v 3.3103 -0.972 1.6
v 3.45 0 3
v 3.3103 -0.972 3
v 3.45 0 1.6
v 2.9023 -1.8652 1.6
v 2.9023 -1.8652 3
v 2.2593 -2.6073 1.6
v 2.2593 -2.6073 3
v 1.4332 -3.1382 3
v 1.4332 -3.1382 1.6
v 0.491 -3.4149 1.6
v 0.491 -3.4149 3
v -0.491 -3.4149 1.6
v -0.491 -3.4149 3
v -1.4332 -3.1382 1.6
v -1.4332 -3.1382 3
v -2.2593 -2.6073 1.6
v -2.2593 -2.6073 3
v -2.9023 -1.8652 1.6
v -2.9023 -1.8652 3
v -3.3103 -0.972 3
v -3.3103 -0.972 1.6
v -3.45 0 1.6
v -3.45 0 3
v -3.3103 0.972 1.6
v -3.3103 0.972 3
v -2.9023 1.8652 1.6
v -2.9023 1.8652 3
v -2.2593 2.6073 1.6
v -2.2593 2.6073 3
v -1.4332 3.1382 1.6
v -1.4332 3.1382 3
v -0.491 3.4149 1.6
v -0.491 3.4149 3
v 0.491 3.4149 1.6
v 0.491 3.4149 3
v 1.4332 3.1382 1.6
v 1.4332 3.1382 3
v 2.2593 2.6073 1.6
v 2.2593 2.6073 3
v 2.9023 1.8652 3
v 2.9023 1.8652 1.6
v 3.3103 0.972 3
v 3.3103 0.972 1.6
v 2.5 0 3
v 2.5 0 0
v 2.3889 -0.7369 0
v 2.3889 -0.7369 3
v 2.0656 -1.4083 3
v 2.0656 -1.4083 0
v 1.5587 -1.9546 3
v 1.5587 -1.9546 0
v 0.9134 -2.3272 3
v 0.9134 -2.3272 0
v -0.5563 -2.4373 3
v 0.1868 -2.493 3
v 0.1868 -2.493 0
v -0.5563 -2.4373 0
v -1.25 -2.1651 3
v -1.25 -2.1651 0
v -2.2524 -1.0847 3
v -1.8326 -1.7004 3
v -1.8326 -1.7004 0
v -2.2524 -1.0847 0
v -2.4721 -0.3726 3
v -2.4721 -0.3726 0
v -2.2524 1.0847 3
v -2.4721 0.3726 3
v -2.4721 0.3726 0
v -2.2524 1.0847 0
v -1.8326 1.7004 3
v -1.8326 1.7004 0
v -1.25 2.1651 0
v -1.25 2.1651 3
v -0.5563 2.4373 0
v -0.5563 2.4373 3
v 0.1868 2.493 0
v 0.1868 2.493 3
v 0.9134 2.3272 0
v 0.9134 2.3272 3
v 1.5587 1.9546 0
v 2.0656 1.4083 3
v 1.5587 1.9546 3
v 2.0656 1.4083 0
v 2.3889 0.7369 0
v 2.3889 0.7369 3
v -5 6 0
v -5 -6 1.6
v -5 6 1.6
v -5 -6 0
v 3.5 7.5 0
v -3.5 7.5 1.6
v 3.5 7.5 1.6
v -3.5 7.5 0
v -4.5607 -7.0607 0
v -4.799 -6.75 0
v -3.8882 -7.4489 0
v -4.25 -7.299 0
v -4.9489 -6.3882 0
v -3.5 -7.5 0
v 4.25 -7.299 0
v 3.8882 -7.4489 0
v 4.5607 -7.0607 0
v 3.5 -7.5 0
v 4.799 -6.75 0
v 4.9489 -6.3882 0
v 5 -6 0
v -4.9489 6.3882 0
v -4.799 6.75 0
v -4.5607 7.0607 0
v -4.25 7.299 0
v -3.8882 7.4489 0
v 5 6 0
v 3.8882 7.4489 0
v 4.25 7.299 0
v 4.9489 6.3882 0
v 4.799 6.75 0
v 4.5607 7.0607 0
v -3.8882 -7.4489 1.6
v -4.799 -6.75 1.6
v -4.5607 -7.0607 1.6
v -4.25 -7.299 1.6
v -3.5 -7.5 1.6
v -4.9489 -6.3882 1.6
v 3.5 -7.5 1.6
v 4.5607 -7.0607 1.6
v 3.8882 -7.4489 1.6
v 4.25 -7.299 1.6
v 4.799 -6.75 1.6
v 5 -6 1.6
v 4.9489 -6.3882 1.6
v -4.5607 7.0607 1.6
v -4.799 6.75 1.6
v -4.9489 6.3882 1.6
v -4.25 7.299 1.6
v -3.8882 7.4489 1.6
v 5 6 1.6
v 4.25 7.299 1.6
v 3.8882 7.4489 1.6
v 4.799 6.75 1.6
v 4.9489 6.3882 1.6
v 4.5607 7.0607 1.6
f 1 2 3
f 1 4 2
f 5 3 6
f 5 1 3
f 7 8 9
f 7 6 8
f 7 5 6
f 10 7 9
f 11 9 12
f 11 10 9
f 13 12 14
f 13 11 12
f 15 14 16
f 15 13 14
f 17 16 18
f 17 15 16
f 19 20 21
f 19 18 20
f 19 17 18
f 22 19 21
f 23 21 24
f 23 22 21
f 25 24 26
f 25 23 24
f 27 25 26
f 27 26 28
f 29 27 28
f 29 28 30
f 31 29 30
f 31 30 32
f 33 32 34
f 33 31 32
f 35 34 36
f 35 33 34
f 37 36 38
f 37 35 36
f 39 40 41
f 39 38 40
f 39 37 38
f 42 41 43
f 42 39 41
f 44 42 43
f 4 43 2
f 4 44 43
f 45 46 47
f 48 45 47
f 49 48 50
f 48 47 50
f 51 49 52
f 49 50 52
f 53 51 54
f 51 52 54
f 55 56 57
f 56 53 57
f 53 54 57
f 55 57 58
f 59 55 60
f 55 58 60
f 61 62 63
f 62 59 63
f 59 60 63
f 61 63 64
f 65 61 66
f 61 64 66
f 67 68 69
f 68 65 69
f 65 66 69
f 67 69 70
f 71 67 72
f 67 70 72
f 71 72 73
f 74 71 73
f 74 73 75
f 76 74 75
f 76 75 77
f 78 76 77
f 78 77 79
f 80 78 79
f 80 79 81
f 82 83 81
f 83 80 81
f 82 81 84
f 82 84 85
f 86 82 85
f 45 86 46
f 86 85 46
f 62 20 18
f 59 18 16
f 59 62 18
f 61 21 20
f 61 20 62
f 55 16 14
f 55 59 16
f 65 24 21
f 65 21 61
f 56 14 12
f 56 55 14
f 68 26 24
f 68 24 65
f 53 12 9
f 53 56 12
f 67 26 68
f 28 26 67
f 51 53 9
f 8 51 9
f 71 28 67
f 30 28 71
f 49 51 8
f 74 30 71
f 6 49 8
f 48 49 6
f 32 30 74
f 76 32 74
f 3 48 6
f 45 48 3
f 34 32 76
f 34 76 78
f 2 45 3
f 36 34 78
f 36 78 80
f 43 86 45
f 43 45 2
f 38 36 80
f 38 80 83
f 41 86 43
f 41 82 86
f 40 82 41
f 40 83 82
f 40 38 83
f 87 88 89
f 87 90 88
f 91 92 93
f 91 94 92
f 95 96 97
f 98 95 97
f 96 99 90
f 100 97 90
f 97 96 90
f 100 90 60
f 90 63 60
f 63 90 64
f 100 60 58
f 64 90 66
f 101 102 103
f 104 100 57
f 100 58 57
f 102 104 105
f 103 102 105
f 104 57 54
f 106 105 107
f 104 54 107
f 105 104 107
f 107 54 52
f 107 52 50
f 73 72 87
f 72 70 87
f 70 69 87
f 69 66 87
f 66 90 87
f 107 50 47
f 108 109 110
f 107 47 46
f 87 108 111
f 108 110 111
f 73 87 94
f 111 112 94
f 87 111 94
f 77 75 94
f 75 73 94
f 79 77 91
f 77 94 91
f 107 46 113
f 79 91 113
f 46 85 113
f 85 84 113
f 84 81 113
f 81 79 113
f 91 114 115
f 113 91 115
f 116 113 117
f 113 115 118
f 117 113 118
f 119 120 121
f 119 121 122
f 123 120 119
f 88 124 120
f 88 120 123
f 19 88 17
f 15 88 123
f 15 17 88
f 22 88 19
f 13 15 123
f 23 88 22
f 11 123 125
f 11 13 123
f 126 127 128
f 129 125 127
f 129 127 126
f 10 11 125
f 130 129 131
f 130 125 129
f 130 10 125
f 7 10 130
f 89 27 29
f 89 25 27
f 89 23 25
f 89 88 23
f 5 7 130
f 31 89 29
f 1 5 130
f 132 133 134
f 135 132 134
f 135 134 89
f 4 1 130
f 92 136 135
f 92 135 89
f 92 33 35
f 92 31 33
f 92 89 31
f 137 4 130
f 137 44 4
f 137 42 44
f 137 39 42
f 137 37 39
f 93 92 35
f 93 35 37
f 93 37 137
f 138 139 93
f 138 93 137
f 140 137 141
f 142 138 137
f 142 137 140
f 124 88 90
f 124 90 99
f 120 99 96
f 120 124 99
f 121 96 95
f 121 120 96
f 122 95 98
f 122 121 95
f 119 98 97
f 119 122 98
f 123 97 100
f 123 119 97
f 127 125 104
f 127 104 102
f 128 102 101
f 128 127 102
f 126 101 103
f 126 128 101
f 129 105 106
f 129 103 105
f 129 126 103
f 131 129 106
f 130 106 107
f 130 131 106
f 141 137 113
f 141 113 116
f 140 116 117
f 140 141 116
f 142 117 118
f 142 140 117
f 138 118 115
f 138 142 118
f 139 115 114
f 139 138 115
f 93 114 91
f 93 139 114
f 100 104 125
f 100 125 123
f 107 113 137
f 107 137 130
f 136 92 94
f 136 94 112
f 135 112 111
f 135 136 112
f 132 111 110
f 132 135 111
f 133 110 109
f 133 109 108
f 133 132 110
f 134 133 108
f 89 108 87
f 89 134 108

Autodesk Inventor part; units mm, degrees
ref_plane "YZ Plane" through (0, 0, 0) normal (1, 0, 0) x (0, 1, 0)
ref_plane "XZ Plane" through (0, 0, 0) normal (0, 1, 0) x (-1, 0, 0)
ref_plane "XY Plane" through (0, 0, 0) normal (0, 0, 1) x (1, 0, 0)
sketch "Sketch1" plane through (0, 0, 0) normal (0, 0, 1) x (1, 0, 0)
  line L0 (-5, 7.5) -> (5, 7.5)
  line L1 (5, 7.5) -> (5, -7.5)
  line L2 (5, -7.5) -> (-5, -7.5)
  line L3 (-5, -7.5) -> (-5, 7.5)
  line L4 (0, 7.5) -> (0, -7.5) construction
  line L5 (-5, 0) -> (5, 0) construction
  circle A0 centre (0, 0) radius 2.5
  dimension "d0" = 15
  dimension "d1" = 10
  dimension "d2" = 5
extrude "Extrusion1" add sketch "Sketch1" along normal blind 1.6
sketch "Sketch2" plane through (0, 0, 1.6) normal (0, 0, 1) x (1, 0, 0)
  circle A0 centre (0, 0) radius 2.5 projected
  circle A1 centre (0, 0) radius 3.45
  dimension "d5" = 6.9
extrude "Extrusion2" add sketch "Sketch2" along normal blind 1.4
thread "Thread1" size "M5x0.8" class "6H" standard "ANSI Metric M Profile" full length
fillet "Fillet1" radius 1.5 4 edges at (5, 7.5, 0.8) (-5, 7.5, 0.8) (-5, -7.5, 0.8) (5, -7.5, 0.8)
properties part number "t-nut"
